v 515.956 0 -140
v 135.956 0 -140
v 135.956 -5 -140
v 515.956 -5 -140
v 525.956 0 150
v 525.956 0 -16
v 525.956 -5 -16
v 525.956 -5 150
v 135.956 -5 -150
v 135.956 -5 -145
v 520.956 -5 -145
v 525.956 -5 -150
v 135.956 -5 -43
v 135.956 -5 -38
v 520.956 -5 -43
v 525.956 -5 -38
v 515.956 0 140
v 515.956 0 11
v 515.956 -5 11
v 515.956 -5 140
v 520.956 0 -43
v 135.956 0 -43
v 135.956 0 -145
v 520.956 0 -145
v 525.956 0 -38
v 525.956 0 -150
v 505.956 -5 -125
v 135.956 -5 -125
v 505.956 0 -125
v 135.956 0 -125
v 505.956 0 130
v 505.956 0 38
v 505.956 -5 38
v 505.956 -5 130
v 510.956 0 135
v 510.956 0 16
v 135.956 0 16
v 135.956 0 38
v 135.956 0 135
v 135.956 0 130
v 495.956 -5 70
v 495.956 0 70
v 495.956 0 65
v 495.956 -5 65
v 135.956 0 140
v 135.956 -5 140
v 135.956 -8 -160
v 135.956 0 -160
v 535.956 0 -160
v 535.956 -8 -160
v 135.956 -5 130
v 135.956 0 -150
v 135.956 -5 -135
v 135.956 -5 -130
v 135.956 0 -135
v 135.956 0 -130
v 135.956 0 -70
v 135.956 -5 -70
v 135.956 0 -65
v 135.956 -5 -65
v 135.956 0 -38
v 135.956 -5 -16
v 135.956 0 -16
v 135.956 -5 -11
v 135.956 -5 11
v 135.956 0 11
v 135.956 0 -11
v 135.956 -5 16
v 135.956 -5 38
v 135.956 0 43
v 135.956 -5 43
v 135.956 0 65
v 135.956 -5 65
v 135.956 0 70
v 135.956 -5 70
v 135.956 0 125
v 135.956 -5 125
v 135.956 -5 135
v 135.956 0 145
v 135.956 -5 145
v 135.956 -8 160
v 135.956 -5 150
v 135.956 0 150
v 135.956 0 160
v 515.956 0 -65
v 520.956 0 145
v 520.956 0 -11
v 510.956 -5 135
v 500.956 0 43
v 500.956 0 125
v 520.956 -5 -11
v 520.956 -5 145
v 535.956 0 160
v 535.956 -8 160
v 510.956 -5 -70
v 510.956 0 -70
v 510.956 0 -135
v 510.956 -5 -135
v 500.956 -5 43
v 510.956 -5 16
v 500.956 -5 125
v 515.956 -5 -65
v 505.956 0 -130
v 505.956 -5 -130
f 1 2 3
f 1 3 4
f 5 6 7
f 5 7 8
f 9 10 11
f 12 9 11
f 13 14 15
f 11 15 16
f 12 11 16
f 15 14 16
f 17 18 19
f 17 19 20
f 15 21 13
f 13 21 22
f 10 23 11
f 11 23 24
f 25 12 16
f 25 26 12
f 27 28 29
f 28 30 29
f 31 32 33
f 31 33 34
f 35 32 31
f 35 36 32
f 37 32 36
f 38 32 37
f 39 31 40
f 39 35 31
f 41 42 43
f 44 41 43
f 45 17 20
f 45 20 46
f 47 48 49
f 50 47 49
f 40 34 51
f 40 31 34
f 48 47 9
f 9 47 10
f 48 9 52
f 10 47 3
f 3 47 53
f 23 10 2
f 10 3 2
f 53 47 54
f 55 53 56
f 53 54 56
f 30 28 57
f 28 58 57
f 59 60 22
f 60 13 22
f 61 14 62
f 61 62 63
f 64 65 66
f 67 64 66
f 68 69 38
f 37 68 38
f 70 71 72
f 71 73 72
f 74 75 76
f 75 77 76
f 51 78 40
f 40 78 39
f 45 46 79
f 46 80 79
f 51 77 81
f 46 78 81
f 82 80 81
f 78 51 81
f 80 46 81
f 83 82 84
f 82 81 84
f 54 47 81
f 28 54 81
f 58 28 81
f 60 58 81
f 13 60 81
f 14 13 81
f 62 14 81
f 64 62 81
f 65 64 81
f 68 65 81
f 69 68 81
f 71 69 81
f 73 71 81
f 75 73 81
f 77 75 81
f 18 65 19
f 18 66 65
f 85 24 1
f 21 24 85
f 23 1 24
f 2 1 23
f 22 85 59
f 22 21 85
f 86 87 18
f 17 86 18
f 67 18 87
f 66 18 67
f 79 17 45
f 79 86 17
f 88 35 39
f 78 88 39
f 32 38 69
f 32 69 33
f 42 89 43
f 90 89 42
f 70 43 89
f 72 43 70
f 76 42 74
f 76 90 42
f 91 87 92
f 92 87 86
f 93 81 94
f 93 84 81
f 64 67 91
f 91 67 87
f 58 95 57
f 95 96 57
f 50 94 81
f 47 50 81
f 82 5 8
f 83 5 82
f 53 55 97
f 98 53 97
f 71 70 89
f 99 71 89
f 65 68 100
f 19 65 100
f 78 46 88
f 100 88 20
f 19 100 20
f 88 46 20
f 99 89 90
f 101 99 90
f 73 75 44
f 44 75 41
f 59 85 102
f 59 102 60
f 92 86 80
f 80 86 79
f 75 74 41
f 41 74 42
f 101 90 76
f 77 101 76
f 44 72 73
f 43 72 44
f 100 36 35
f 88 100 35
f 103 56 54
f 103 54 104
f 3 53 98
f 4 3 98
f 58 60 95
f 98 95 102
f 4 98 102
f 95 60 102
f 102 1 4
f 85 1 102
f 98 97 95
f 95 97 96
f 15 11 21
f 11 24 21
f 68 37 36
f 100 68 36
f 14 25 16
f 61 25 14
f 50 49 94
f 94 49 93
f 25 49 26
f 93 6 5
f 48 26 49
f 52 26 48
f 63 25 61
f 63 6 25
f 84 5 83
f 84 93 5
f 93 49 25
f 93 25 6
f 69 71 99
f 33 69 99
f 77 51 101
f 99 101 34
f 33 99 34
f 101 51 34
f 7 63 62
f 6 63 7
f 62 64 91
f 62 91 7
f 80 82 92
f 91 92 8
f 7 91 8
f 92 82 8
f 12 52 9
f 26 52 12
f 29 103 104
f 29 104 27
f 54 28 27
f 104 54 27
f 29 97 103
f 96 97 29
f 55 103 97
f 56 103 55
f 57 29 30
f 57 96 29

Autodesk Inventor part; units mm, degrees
ref_plane "YZ Plane" through (0, 0, 0) normal (1, 0, 0) x (0, 1, 0)
ref_plane "XZ Plane" through (0, 0, 0) normal (0, 1, 0) x (-1, 0, 0)
ref_plane "XY Plane" through (0, 0, 0) normal (0, 0, 1) x (1, 0, 0)
sketch "Sketch1" plane through (0, 0, 0) normal (0, 1, 0) x (-1, 0, 0)
  line L0 (-135.9557, -16) -> (-525.9557, -16)
  line L1 (-525.9557, -16) -> (-525.9557, 150)
  line L2 (-135.9557, -11) -> (-520.9557, -11)
  line L3 (-520.9557, -11) -> (-520.9557, 145)
  line L4 (-510.9557, 16) -> (-510.9557, 135)
  line L5 (-515.9557, 11) -> (-515.9557, 140)
  line L6 (-500.9557, 43) -> (-500.9557, 125)
  line L7 (-505.9557, 38) -> (-505.9557, 130)
  line L8 (-495.9557, 70) -> (-495.9557, 65)
  line L9 (-535.9557, 160) -> (-135.9557, 160)
  line L10 (-135.9557, 160) -> (-135.9557, -160)
  line L11 (-135.9557, -160) -> (-535.9557, -160)
  line L12 (-535.9557, -160) -> (-535.9557, 160)
  line L13 (-525.9557, -150) -> (-525.9557, -38)
  line L14 (-520.9557, -145) -> (-520.9557, -43)
  line L15 (-510.9557, -135) -> (-510.9557, -70)
  line L16 (-515.9557, -140) -> (-515.9557, -65)
  line L17 (-505.9557, -130) -> (-505.9557, -125)
  line L18 (-525.9557, 150) -> (-135.9557, 150)
  line L19 (-520.9557, 145) -> (-135.9557, 145)
  line L20 (-515.9557, 140) -> (-135.9557, 140)
  line L21 (-505.9557, 130) -> (-135.9557, 130)
  line L22 (-500.9557, 125) -> (-135.9557, 125)
  line L23 (-510.9557, 135) -> (-135.9557, 135)
  line L24 (-135.9557, 70) -> (-495.9557, 70)
  line L25 (-135.9557, 65) -> (-495.9557, 65)
  line L26 (-135.9557, 43) -> (-500.9557, 43)
  line L27 (-135.9557, 38) -> (-505.9557, 38)
  line L28 (-135.9557, 16) -> (-510.9557, 16)
  line L29 (-135.9557, 11) -> (-515.9557, 11)
  line L30 (-525.9557, -38) -> (-135.9557, -38)
  line L31 (-520.9557, -43) -> (-135.9557, -43)
  line L32 (-515.9557, -65) -> (-135.9557, -65)
  line L33 (-510.9557, -70) -> (-135.9557, -70)
  line L34 (-135.9557, -125) -> (-505.9557, -125)
  line L35 (-135.9557, -130) -> (-505.9557, -130)
  line L36 (-135.9557, -135) -> (-510.9557, -135)
  line L37 (-135.9557, -140) -> (-515.9557, -140)
  line L38 (-135.9557, -145) -> (-520.9557, -145)
  line L39 (-135.9557, -150) -> (-525.9557, -150)
  dimension "d2" = 5
  dimension "d6" = 5
  dimension "d13" = 5
  dimension "d17" = 5
  dimension "d23" = 5
  dimension "d24" = 5
  dimension "d30" = 400
  dimension "d31" = 320
  dimension "d35" = 5
  dimension "d40" = 5
  dimension "d43" = 5
  dimension "d46" = 5
  dimension "d52" = 10
  dimension "d53" = 10
extrude "Extrusion1" add sketch "Sketch1" against normal blind 5 contours L10 L30 L13 L39 L11 L12 L9 L18 L1 L0 | L2 L3 L19 L10 L20 L5 L29 | L10 L32 L16 L37 L38 L14 L31 | L28 L4 L23 L10 L21 L7 L27 | L10 L34 L17 L35 L36 L15 L33 | L26 L6 L22 L10 L24 L8 L25
ref_plane "Work Plane2" through (135.9557, 0, 160) normal (0, 0, 1) x (1, 0, 0)
sketch "Sketch3" plane through (135.9557, 0, 160) normal (0, 0, 1) x (1, 0, 0)
  line L0 (0, 0) -> (0, -5) projected
  line L1 (0, -5) -> (400, -5)
  line L2 (400, -5) -> (400, -8)
  line L3 (400, -8) -> (0, -8)
  line L4 (0, -8) -> (0, -5)
  point P0 (-135.9557, 0)
  dimension "d62" = 3
extrude "Extrusion3" add sketch "Sketch3" against normal blind 320
equation "\"d2\" = d25"
equation "\"d6\" = d26"
equation "\"d13\" = d25"
equation "\"d17\" = d26"
equation "\"d23\" = d25"
equation "\"d24\" = d26"
equation "\"d35\" = d47"
equation "\"d40\" = d47"
equation "\"d43\" = d49"
equation "\"d46\" = d49"
equation "\"d3\" = d25"
equation "\"d4\" = d25"
equation "\"d5\" = d26"
equation "\"d7\" = d25"
equation "\"d8\" = d25"
equation "\"d9\" = d25"
equation "\"d10\" = d26"
equation "\"d12\" = d28"
equation "\"d14\" = d25"
equation "\"d15\" = d28"
equation "\"d16\" = d26"
equation "\"d18\" = d25"
equation "\"d19\" = d25"
equation "\"d20\" = d28"
equation "\"d21\" = d25"
equation "\"d22\" = d25"
equation "\"d25\" = 5"
equation "\"d26\" = 5"
equation "\"d28\" = -1.2 * d25 + 0.2 * d29"
equation "\"d34\" = d47"
equation "\"d36\" = d47"
equation "\"d37\" = d48"
equation "\"d38\" = d47"
equation "\"d39\" = d49"
equation "\"d41\" = d47"
equation "\"d42\" = d48"
equation "\"d44\" = d47"
equation "\"d45\" = d49"
equation "\"d47\" = 5"
equation "\"d48\" = -1.2 * d47 + 0.2 * d50"
equation "\"d49\" = 5"
equation "\"d29\" = 140"
equation "\"d50\" = 140"
properties part number "WIRE HOUSING"
